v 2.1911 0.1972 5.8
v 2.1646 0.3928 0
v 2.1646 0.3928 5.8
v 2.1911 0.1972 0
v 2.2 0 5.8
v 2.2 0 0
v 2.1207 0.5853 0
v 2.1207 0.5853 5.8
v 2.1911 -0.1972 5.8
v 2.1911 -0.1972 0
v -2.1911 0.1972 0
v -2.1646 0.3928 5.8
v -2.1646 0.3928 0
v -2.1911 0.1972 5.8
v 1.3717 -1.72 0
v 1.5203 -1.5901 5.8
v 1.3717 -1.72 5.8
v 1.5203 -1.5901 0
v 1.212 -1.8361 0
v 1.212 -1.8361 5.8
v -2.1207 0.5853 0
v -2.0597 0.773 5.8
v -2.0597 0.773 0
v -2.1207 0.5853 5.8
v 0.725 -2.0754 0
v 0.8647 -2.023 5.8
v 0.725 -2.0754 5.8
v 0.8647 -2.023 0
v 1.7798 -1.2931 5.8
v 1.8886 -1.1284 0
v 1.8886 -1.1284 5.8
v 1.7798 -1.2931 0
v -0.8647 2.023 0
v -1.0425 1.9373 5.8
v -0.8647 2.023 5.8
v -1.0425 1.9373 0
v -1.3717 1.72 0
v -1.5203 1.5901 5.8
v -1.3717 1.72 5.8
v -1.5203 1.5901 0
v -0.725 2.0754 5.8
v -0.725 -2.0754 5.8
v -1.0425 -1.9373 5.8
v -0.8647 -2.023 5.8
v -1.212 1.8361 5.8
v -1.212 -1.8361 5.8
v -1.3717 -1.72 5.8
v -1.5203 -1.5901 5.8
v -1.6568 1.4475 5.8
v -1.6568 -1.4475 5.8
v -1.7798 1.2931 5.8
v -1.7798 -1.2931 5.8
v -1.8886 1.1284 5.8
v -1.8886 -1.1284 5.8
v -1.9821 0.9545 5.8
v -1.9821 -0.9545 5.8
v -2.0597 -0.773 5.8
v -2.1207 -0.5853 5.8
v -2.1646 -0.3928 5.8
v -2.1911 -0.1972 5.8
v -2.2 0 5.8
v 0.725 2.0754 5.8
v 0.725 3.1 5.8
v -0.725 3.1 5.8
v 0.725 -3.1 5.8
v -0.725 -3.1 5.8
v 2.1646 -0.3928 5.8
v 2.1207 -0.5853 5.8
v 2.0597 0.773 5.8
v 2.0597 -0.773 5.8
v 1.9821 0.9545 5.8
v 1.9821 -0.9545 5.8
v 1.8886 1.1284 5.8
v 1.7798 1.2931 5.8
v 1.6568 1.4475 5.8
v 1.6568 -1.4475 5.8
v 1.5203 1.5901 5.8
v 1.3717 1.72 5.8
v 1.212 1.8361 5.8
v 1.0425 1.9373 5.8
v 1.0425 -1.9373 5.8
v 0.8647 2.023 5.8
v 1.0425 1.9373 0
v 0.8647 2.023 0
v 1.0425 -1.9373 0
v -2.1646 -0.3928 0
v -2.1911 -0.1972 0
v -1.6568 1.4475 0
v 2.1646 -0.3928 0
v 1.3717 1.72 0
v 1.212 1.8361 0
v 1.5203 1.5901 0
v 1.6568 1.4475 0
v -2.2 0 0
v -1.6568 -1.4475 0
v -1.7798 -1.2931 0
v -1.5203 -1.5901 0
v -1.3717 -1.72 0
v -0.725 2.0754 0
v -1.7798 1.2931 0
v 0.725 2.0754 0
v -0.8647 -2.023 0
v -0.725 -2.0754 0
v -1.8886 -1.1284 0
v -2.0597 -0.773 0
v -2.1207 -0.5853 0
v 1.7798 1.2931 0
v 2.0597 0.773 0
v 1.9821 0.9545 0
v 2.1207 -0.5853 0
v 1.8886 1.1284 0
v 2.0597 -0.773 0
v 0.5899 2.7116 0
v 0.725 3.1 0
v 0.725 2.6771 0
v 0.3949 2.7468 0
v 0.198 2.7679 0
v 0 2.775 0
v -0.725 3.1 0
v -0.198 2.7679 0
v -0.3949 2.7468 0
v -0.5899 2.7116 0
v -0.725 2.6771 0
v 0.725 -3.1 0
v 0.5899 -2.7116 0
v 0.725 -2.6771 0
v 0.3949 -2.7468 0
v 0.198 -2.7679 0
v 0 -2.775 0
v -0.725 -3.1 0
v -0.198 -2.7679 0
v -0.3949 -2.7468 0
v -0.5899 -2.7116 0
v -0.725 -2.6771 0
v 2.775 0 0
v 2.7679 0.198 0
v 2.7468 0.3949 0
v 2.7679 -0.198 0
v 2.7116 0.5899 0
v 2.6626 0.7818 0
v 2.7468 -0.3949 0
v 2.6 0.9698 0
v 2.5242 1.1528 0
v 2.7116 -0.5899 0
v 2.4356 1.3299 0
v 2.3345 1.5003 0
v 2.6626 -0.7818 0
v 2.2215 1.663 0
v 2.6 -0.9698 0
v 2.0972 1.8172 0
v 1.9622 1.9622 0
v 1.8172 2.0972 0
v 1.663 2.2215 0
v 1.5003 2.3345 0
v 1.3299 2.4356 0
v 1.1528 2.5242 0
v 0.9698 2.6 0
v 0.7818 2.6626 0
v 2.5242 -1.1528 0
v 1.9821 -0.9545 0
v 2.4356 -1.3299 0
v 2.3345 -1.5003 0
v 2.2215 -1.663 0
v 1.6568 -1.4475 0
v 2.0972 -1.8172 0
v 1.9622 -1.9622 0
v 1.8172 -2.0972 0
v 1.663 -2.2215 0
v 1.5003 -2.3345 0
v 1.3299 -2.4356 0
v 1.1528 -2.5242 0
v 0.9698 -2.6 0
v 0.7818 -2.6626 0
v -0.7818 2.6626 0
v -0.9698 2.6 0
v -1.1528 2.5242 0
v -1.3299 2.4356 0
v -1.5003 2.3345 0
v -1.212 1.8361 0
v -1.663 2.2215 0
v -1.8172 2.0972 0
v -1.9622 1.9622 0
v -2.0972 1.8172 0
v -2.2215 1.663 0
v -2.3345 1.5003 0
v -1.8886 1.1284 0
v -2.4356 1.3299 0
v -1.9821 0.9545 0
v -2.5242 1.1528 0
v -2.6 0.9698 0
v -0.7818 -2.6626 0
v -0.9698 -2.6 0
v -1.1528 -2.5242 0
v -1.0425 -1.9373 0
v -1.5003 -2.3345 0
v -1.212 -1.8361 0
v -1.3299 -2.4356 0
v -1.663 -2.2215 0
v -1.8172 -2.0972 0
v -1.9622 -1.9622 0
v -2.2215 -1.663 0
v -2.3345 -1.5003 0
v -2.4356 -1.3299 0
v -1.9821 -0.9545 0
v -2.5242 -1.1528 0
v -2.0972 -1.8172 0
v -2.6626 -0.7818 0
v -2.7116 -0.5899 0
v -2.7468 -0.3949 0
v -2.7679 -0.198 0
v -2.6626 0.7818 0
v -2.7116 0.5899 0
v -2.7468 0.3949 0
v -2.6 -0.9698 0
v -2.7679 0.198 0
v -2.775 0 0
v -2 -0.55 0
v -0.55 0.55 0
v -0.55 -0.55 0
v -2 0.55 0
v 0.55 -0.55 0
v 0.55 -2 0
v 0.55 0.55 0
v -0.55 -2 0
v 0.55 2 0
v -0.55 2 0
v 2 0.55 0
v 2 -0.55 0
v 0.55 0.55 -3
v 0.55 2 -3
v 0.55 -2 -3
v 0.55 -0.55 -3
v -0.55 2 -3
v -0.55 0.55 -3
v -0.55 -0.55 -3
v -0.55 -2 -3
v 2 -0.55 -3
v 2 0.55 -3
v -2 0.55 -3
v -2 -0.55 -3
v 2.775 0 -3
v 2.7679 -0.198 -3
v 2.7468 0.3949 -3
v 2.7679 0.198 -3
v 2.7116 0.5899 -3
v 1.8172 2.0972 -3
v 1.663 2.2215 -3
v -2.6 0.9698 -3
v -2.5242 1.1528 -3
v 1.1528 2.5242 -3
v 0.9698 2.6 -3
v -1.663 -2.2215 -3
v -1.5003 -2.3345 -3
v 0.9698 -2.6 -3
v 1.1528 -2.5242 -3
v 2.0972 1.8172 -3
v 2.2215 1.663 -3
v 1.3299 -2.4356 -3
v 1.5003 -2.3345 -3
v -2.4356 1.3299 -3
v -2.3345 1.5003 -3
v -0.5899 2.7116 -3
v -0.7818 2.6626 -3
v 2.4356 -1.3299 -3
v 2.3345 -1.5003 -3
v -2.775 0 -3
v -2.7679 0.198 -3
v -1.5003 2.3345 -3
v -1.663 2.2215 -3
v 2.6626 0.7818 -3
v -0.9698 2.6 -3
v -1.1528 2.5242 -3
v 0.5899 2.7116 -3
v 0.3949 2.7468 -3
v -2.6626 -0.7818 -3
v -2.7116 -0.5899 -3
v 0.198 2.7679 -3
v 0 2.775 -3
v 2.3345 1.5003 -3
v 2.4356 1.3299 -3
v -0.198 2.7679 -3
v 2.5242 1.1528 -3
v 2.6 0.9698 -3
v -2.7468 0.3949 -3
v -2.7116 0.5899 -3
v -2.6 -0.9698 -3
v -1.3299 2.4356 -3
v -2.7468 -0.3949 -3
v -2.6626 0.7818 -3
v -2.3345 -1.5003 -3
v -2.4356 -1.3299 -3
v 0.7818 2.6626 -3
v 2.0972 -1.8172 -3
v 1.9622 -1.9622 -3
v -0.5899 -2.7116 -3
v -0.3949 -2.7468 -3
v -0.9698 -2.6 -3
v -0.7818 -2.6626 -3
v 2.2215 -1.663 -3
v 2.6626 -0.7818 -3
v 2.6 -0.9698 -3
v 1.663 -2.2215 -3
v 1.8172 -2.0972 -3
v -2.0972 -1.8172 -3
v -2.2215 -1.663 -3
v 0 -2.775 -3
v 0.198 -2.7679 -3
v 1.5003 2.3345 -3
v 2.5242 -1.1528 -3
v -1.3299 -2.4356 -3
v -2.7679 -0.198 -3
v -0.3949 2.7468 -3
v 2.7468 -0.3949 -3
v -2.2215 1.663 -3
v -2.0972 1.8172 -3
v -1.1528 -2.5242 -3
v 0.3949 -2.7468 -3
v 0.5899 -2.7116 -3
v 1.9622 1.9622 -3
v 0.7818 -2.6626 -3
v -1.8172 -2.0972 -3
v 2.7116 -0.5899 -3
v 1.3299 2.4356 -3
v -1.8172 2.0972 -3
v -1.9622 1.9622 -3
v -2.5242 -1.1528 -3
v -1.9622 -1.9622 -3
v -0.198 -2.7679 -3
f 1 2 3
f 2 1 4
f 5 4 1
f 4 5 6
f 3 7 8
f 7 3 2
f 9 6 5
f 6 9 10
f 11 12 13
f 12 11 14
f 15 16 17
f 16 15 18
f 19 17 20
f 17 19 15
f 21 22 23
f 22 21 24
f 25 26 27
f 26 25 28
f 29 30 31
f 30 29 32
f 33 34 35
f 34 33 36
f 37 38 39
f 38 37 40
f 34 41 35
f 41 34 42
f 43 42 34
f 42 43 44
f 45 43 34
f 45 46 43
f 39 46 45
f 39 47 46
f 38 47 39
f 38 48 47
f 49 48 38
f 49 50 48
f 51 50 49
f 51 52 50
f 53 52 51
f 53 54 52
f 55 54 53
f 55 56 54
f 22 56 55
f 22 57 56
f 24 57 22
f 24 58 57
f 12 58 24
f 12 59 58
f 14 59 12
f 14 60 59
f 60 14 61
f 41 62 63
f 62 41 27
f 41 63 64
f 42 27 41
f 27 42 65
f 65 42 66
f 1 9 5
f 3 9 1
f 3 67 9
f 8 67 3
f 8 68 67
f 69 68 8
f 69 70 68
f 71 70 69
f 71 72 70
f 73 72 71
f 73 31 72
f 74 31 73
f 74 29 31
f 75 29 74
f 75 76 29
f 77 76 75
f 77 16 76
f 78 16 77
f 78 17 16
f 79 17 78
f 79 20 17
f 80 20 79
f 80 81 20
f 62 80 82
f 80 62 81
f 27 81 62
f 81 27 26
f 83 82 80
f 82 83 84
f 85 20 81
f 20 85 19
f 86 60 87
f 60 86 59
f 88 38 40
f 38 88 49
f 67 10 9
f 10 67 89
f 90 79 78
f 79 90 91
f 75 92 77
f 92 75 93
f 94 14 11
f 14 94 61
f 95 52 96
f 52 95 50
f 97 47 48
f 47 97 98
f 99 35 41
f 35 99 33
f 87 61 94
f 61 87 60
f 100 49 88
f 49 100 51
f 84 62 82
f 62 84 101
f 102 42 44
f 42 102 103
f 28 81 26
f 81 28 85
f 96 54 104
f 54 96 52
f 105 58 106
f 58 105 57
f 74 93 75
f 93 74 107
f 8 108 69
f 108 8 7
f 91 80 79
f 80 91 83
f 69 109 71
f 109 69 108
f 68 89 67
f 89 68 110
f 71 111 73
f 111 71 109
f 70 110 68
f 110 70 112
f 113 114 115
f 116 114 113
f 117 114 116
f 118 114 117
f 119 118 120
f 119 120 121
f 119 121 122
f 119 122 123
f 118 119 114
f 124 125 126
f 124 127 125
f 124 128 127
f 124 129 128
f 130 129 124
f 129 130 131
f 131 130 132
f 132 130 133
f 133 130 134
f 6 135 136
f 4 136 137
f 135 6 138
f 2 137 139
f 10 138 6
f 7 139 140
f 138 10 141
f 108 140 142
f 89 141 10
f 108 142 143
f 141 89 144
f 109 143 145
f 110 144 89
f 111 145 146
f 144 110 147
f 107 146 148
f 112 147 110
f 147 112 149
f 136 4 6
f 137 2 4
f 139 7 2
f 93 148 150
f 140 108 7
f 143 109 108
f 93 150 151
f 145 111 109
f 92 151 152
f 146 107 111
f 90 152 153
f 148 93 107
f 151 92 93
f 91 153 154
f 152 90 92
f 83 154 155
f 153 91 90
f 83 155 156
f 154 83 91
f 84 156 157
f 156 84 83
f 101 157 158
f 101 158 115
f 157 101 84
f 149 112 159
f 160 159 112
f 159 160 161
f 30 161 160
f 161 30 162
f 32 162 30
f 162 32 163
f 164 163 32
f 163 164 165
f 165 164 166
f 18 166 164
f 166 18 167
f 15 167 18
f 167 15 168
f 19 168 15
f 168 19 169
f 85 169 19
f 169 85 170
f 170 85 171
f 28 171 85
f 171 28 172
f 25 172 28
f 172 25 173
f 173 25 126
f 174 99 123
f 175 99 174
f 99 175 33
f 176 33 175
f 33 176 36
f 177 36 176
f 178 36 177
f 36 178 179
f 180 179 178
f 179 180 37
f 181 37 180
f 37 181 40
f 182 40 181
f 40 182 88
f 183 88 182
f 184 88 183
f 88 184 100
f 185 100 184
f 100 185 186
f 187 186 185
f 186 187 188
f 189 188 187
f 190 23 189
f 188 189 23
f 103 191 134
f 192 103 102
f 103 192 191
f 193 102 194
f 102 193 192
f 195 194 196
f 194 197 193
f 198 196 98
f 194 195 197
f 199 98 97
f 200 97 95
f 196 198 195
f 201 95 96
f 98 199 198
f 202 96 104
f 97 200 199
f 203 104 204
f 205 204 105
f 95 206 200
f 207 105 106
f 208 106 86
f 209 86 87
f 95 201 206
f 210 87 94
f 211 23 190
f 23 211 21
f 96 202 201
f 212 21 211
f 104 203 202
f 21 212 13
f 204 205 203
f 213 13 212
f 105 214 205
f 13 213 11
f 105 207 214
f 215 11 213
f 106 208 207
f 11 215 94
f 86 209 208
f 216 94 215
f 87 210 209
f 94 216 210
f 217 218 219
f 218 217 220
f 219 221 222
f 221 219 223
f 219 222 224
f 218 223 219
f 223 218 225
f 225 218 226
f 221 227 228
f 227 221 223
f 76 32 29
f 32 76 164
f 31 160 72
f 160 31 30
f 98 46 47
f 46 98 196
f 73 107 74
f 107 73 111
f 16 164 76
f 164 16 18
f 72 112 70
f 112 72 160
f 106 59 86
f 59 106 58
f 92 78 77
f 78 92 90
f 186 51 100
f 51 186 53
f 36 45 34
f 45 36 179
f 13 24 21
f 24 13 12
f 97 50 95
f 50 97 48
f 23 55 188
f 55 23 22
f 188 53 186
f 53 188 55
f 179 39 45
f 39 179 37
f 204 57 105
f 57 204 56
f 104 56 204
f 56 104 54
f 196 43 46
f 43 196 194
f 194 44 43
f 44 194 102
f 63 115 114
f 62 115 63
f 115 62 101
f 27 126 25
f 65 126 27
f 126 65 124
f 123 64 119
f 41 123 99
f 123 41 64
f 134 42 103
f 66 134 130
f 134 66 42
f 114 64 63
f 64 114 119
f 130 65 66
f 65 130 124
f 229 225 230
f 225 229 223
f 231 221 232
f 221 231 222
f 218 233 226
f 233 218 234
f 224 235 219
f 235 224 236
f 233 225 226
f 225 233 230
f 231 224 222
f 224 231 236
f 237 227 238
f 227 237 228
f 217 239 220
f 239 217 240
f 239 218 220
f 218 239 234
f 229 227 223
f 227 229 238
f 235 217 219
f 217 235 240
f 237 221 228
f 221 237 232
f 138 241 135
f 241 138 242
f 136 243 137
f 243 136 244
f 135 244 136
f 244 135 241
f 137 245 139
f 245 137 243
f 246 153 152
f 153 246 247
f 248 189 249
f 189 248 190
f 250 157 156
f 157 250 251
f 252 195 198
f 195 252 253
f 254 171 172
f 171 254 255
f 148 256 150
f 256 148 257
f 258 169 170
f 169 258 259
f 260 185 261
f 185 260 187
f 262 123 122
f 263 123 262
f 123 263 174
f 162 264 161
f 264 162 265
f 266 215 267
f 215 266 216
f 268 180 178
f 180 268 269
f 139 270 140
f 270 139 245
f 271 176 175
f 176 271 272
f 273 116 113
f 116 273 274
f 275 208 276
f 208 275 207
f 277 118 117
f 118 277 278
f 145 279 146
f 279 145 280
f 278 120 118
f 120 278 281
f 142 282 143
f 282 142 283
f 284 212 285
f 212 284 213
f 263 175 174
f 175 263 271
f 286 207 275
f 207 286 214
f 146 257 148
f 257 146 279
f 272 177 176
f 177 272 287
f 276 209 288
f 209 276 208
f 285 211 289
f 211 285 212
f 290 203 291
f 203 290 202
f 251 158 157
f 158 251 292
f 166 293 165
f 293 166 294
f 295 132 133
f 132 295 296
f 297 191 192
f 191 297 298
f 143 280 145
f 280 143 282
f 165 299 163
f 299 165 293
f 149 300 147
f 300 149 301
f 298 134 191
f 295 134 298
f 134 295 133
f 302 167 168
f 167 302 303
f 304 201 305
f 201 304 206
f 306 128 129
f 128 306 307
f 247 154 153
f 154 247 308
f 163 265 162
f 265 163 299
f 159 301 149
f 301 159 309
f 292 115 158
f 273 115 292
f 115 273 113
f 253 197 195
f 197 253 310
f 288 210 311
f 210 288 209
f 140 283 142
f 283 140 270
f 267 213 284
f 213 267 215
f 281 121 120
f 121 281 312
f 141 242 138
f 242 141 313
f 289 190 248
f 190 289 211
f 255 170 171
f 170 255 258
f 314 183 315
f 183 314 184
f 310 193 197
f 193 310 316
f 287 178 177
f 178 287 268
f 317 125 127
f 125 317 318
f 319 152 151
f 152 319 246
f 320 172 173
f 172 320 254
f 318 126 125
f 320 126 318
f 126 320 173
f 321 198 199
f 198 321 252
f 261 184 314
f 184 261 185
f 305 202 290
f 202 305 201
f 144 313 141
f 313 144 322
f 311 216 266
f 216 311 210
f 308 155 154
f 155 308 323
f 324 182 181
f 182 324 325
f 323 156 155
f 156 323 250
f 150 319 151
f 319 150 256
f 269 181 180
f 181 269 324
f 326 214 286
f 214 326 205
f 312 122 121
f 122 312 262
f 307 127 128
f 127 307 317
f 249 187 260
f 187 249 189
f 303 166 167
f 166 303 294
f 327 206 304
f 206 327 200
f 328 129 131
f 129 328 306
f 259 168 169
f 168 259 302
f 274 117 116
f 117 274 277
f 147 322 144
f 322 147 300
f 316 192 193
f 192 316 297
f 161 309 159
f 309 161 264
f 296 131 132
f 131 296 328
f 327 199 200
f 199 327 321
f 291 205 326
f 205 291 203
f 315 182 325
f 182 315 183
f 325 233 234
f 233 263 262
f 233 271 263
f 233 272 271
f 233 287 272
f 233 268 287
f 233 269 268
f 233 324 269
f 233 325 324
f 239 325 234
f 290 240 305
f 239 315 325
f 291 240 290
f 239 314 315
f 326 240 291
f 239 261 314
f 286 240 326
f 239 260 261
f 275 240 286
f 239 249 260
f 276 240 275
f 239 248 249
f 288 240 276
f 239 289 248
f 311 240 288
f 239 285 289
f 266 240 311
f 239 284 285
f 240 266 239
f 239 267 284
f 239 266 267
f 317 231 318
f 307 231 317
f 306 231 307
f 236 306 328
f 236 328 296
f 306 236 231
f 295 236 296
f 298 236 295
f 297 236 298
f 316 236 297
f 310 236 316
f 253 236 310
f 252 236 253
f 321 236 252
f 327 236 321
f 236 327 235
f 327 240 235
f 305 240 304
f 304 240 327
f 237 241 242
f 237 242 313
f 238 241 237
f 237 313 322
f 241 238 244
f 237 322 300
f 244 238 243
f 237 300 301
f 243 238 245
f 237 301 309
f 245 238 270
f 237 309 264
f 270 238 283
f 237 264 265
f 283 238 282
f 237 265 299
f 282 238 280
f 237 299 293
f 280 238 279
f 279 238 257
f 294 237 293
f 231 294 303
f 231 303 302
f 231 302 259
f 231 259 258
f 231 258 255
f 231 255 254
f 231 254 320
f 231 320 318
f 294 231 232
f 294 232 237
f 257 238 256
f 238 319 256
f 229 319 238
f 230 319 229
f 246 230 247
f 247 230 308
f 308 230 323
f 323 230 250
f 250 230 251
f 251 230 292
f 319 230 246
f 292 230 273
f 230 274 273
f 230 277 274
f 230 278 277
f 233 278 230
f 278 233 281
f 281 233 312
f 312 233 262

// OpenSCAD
// Stems and adapters to connect vintage key caps to modern switches
// (c) Bertrand Le Roy
// Licensed under MIT

$fa = 1;
$fs = 0.2;

// Cap type
cap_type = "Atari XE ◎"; // [Atari XE ◎, Atari XE ■, Atari XE Console Key, Atari XE Console Set, Atari XE F1-4 Set, Atari XL ✚, Atari XL Alps ▬, Atari XL ⧇, Atari 800 ■, Atari XL Console Key, Atari 1200XL Console Key, KailhBox]

// Stem type
stem_type = "Low-pro adapter"; // [Low-pro adapter, Kailh Choc v1, Kailh Box Pink, MX Adapter]

// Legend
legend = ""; // ["", Start, Option, Select, Help, Reset, F1, F2, F3, F4, F5, F6, F7, F8, F9, F10, F11, F12]

// Repeat rows
rows = 1; // [1:1:10]

// Repeat columns
columns = 1; // [1:1:10]

// Link models from the sides
link_models = false;

// Support from under
support = false;

// Rotate switch 90 degrees
rotate_switch = false;

// Accurate production
accurate = true;

row_count = rows;
column_count = cap_type == "Atari XE Console Set" ? 5 : cap_type == "Atari XE F1-4 Set" ? 4 : columns;

module nil() {}

box_width = 6.40;
box_height = 4.7;
box_inner_width = 6;
box_inner_corner_radius = 2;
box_cross_x_thickness = 1.3;
box_cross_y_thickness = 1.1;
box_cross_width = 4;
box_bottom_thickness = 0.7;
box_bottom_outer_offset = 0.02;
extra_floor = 1;
support_diameter = 1.5;
support_height = 2;
support_plate_height = 1.5;

module kailh_box() {
  union() {
    difference() {
      cube([box_width, box_width, box_height], center = true);
      minkowski() {
        cube([
          box_inner_width - box_inner_corner_radius * 2,
          box_inner_width - box_inner_corner_radius * 2,
          box_height + 0.1], center = true);
        cylinder(r = box_inner_corner_radius);
      }
    };
    cube([box_cross_width, box_cross_x_thickness, box_height], center = true);
    cube([box_cross_y_thickness, box_cross_width, box_height], center = true);
    translate([0, 0, (box_bottom_thickness - box_height) / 2])
      cube([box_width, box_width, box_bottom_thickness], center = true);
  }
}

atari_box_width = 6.40;
atari_box_height = 4;
atari_square_width = accurate ? 3.05 : 3.2;
atari_square_depth = 2.8;
atari_square_circle_radius = atari_square_width * sqrt(2) / 2;
//atari_box_bottom_thickness = 0.7;
atari_box_bottom_outer_offset = 0.05;

module atarixe_square() {
  union() {
    difference() {
      cube([atari_box_width, atari_box_width, atari_box_height], center = true);
      cube([atari_square_width, atari_square_width, atari_box_height + 0.1], center = true);
      translate([0, 0, (atari_square_depth - 1) / 2])
        cylinder(r = atari_square_circle_radius, h = atari_box_height - atari_square_depth + 0.1);
      // Add a recess at the bottom so if resin residues cling in the angles, they do so without preventing the cap from going in completely.
      rotate([0, 0, 45])
        translate([0, 0, 1 - atari_square_depth - 0.1])
          cylinder(h = 1, d1 = atari_square_circle_radius * 2 + 1, d2 = atari_square_circle_radius * 2, $fn = 4);
    }
  }
}

atari_circle_inner_diameter = accurate ? 4.40 : 4.25;
atari_circle_wing_thickness = accurate ? 1.45 : 1.40;
atari_circle_depth = accurate ? 4.8 : 4.0;

module atarixe_circle() {
  union() {
    cylinder(r = atari_circle_inner_diameter / 2, h = atari_circle_depth + extra_floor);
    translate([0, 0, (atari_circle_depth + extra_floor) / 2])
      cube([atari_circle_wing_thickness, atari_box_width - 0.2, atari_circle_depth + extra_floor], center = true);
  }
}

atari_alps_width = 4.6;
atari_alps_depth = 2.3;
atari_alps_height = box_height - 2;
atari_alps_offset = 0;
atari_alps_teeth_width = 0.4;
atari_alps_teeth_depth = 0.2;

module atarixl_alps() {
  union() {
    difference() {
      cube([box_width, box_width, box_height], center = true);
      translate([0, atari_alps_offset + atari_alps_teeth_depth, (box_height - atari_alps_height) / 2 + 0.1])
        difference() {
          cube([atari_alps_width, atari_alps_depth + atari_alps_teeth_depth, atari_alps_height + 0.1], center = true);
          translate([atari_alps_width / 4, atari_alps_depth / 2 + 0.05, 0])
            cube([atari_alps_teeth_width, atari_alps_teeth_depth + 0.05, atari_alps_height], center = true);
          translate([-atari_alps_width / 4, atari_alps_depth / 2 + 0.05, 0])
            cube([atari_alps_teeth_width, atari_alps_teeth_depth + 0.05, atari_alps_height], center = true);
        }
    };
    translate([0, 0, (box_bottom_thickness - box_height) / 2])
      cube([box_width, box_width, box_bottom_thickness], center = true);
  }
}

atarixl_cross_thickness = 1.3;
atarixl_cross_size = 4.4;
atarixl_cross_height = 3.5;
atarixl_cross_teeth_width = 0.4;
atarixl_cross_teeth_depth = 0.05;

module atarixl_cross() {
  translate([0, 0, 0.05])
    union() {
      cube([atarixl_cross_thickness, atarixl_cross_size, atarixl_cross_height + 0.1], center = true);
      cube([atarixl_cross_size, atarixl_cross_thickness, atarixl_cross_height + 0.1], center = true);
      // Teeth:
      translate([3 * atarixl_cross_size / 8, 0, 0])
        cube([atarixl_cross_teeth_width, atarixl_cross_thickness + atarixl_cross_teeth_depth * 2, atarixl_cross_height], center = true);
      translate([-3 * atarixl_cross_size / 8, 0, 0])
        cube([atarixl_cross_teeth_width, atarixl_cross_thickness + atarixl_cross_teeth_depth * 2, atarixl_cross_height], center = true);
      translate([0, 3 * atarixl_cross_size / 8, 0])
        cube([atarixl_cross_thickness + atarixl_cross_teeth_depth * 2, atarixl_cross_teeth_width, atarixl_cross_height], center = true);
      translate([0, -3 * atarixl_cross_size / 8, 0])
        cube([atarixl_cross_thickness + atarixl_cross_teeth_depth * 2, atarixl_cross_teeth_width, atarixl_cross_height], center = true);
    }
}

atarixl_square_size = cap_type == "Atari 800 ■" ? 4.7 : 5.0;
atarixl_square_height = cap_type == "Atari 800 ■" ? 4 : 7;
atarixl_square_teeth_width = 0.4;
atarixl_square_teeth_depth = 0.05;

module atarixl_square() {
  union() {
    cube([atarixl_square_size, atarixl_square_size, atarixl_square_height], center = true);
    cube([atarixl_square_size + atarixl_square_teeth_depth * 2, atarixl_square_teeth_width, atarixl_square_height], center = true);
    cube([atarixl_square_teeth_width, atarixl_square_size + atarixl_square_teeth_depth * 2, atarixl_square_height], center = true);
  }
}

kailh_stem_horizontal_offset = 0.47;
kailh_stem_spring_column_height = 6.3;
kailh_stem_spring_column_bottom_diameter = 1.40;
kailh_stem_spring_column_upper_diameter = 1;
kailh_stem_spring_column_top_height = 0.3;
kailh_stem_spring_column_cone_height = 1.5;
kailh_stem_spring_column_offset = -0.60;
kailh_stem_main_height = 5;
kailh_stem_main_width = box_width;
kailh_stem_main_depth_left = 4.0;
kailh_stem_main_depth_middle = 4.65;
kailh_stem_main_depth_right = 3.25;
kailh_stem_main_extension_width = 1.8;
kailh_stem_main_hole_diameter = 3.8;
kailh_stem_main_hole_width = 5.1;
kailh_stem_main_hole_depth = 2;
kailh_stem_main_hole_corner_radius = 0.5;
kailh_stem_rail_thickness = 0.6;
kailh_stem_rail_width = 0.35;
kailh_stem_rail3_width = 4.70;
kailh_stem_left_rail1_x = 0.8;
kailh_stem_left_rail2_x = 3.2;
kailh_stem_left_rail3_y = 2.9;
kailh_stem_right_rail1_x = 0.8;
kailh_stem_right_rail2_x = 3.0;
kailh_stem_right_rail3_y = 2.9;
kailh_clicker_top_height = 1.3;
kailh_clicker_top_length = 0.3;
kailh_clicker_rail_height = 0.3;
kailh_clicker_gentle_slope_length = 1.75;
kailh_clicker_steep_slope_length = 0.35;
kailh_clicker_flat_length = 2;
kailh_clicker_rail_width = 0.6;
kailh_breaker_width = 1.6;
kailh_breaker_flat_length = 1.5;
kailh_breaker_slope_length = 1.9;
kailh_breaker_top = 0.8;
kailh_breaker_outcrop = 0.8;
kailh_breaker_bottom = -0.4;

kailh_stem_height = kailh_stem_spring_column_height;

module kailh_rails(rail1_x, rail2_x, rail3_y, rail_width, rail_thickness, rail3_width) {
  translate([0, rail1_x, (kailh_stem_spring_column_height - kailh_stem_main_height) / 2])
    cube([rail_thickness, rail_width, kailh_stem_main_height], center = true);
  translate([0, rail2_x, (kailh_stem_spring_column_height - kailh_stem_main_height) / 2])
    cube([rail_thickness, rail_width, kailh_stem_main_height], center = true);
  translate([0, (rail2_x + rail1_x) / 2, rail3_y - rail3_width / 2])
    cube([rail_thickness, rail2_x - rail1_x - rail_width, rail3_width], center = true);
}

module kailh_stem() {
  union() {
    // Main part
    translate([0, 0, (kailh_stem_spring_column_height - kailh_stem_main_height) / 2])
      difference() {
        union() {
          linear_extrude(height = kailh_stem_main_height, center = true) {
            polygon(points = [
              [-kailh_stem_main_width / 2, -box_width / 2],
              [kailh_stem_main_width / 2, -box_width / 2],
              [kailh_stem_main_width / 2, kailh_stem_main_depth_right - box_width / 2],
              [kailh_stem_main_extension_width / 2 + (kailh_stem_main_depth_middle - kailh_stem_main_depth_right), kailh_stem_main_depth_right - box_width / 2],
              [kailh_stem_main_extension_width / 2, kailh_stem_main_depth_middle - box_width / 2],
              [-kailh_stem_main_extension_width / 2, kailh_stem_main_depth_middle - box_width / 2],
              [-kailh_stem_main_extension_width / 2 - (kailh_stem_main_depth_middle - kailh_stem_main_depth_left), kailh_stem_main_depth_left - box_width / 2],
              [-kailh_stem_main_width / 2, kailh_stem_main_depth_left - box_width / 2],
            ], convexity = 10);
          }
          // Contact breaker
          kailh_breaker_height = kailh_breaker_slope_length + kailh_breaker_flat_length;
          translate([kailh_stem_main_width / 2, 0, kailh_breaker_height - kailh_stem_main_height / 2 - kailh_breaker_outcrop])
            rotate([-90, 0, 90])
              linear_extrude(height = kailh_breaker_width) {
                polygon(points = [
                  [kailh_breaker_bottom, 0],
                  [0, 0],
                  [kailh_breaker_top, kailh_breaker_slope_length],
                  [kailh_breaker_top, kailh_breaker_height],
                  [kailh_breaker_bottom, kailh_breaker_height]
                ], convexity = 4);
              }
        }
        translate([0, kailh_stem_spring_column_offset, 0])
          union() {
            translate([0, 0, -extra_floor/2 - 0.5])
              cylinder(r = kailh_stem_main_hole_diameter / 2, h = kailh_stem_height - extra_floor + 1, center = true);
            hull() {
              translate([kailh_stem_main_hole_corner_radius - kailh_stem_main_hole_width / 2, -kailh_stem_main_hole_corner_radius, -extra_floor])
                cylinder(r = kailh_stem_main_hole_corner_radius, h = kailh_stem_height - extra_floor + 1, center = true);
              translate([kailh_stem_main_hole_width / 2 - kailh_stem_main_hole_corner_radius, -kailh_stem_main_hole_corner_radius, -extra_floor])
                cylinder(r = kailh_stem_main_hole_corner_radius, h = kailh_stem_height - extra_floor + 1, center = true);
              translate([kailh_stem_main_hole_corner_radius - kailh_stem_main_hole_width / 2, kailh_stem_main_hole_corner_radius - kailh_stem_main_hole_depth, -extra_floor])
                cylinder(r = kailh_stem_main_hole_corner_radius, h = kailh_stem_height - extra_floor + 1, center = true);
              translate([kailh_stem_main_hole_width / 2 - kailh_stem_main_hole_corner_radius, kailh_stem_main_hole_corner_radius - kailh_stem_main_hole_depth, -extra_floor])
                cylinder(r = kailh_stem_main_hole_corner_radius, h = kailh_stem_height - extra_floor + 1, center = true);
            }
          }
      }
    // Spring cone
    translate([0, kailh_stem_spring_column_offset, kailh_stem_spring_column_height / 2])
      rotate([180, 0, 0])
        rotate_extrude()
          polygon(points = [
            [0, 0],
            [kailh_stem_spring_column_bottom_diameter / 2, 0],
            [kailh_stem_spring_column_bottom_diameter / 2, kailh_stem_spring_column_height - kailh_stem_spring_column_cone_height - kailh_stem_spring_column_top_height],
            [kailh_stem_spring_column_upper_diameter / 2, kailh_stem_spring_column_height - kailh_stem_spring_column_top_height],
            [kailh_stem_spring_column_upper_diameter / 2, kailh_stem_spring_column_height],
            [0, kailh_stem_spring_column_height]
          ], convexity = 4);
    // Rails
    translate([-(kailh_stem_main_width + kailh_stem_rail_thickness) / 2, -kailh_stem_main_width / 2, 0])
      kailh_rails(kailh_stem_left_rail1_x, kailh_stem_left_rail2_x, kailh_stem_left_rail3_y, kailh_stem_rail_width, kailh_stem_rail_thickness, kailh_stem_rail3_width);
    translate([(kailh_stem_main_width + kailh_stem_rail_thickness) / 2, -kailh_stem_main_width / 2, 0])
      kailh_rails(kailh_stem_right_rail1_x, kailh_stem_right_rail2_x, kailh_stem_right_rail3_y, kailh_stem_rail_width, kailh_stem_rail_thickness, kailh_stem_rail3_width);
    // Clicker
    kailh_clicker_height = kailh_clicker_flat_length + kailh_clicker_gentle_slope_length + kailh_clicker_top_length + kailh_clicker_steep_slope_length;
    translate([kailh_stem_main_width / 2, -box_width / 2, kailh_stem_height / 2])
      rotate([0, 90, 180])
        linear_extrude(height = kailh_clicker_rail_width) {
          polygon(points = [
            [0, 0],
            [0, kailh_clicker_rail_height],
            [kailh_clicker_flat_length, kailh_clicker_rail_height],
            [kailh_clicker_flat_length + kailh_clicker_gentle_slope_length, kailh_clicker_top_height],
            [kailh_clicker_flat_length + kailh_clicker_gentle_slope_length + kailh_clicker_top_length, kailh_clicker_top_height],
            [kailh_clicker_height, 0]
          ], convexity = 4);
      }
  }
}

kailh_choc_height = 3.0 * 2;
kailh_choc_base_dimensions = [9.0, 3.95, 1.0];
kailh_choc_insert_distance = 5.7;
kailh_choc_insert_dimensions = accurate ? [1.15, 2.9, 4.0] : [0.90, 2.6, 3.6];
kailh_choc_insert_teeth_width = 0.4;
kailh_choc_insert_teeth_depth = "Atari XE Console Key" || cap_type == "Atari XE Console Set" || cap_type == "Atari XE F1-4 Set" ? 0.1 : 0.05;

module kailh_choc() {
  translate([0, 0, kailh_choc_height / 2])
    cube(kailh_choc_base_dimensions, center = true);
  translate([kailh_choc_insert_distance / 2, 0, kailh_choc_height / 4])
    union() {
      cube(kailh_choc_insert_dimensions, center = true);
      // Tooth
      cube([kailh_choc_insert_dimensions[0] + kailh_choc_insert_teeth_depth * 2, kailh_choc_insert_teeth_width, kailh_choc_insert_dimensions[2]], center = true);
    }
  translate([-kailh_choc_insert_distance / 2, 0, kailh_choc_height / 4])
    union() {
      cube(kailh_choc_insert_dimensions, center = true);
      cube([kailh_choc_insert_dimensions[0] + kailh_choc_insert_teeth_depth * 2, kailh_choc_insert_teeth_width, kailh_choc_insert_dimensions[2]], center = true);
    }
}

low_pro_adapter_height = 3.0;
mxadapter_stem_height = stem_type == "Low-pro adapter" ? low_pro_adapter_height : 3;
mxadapter_stem_diameter = 5.55;
mxadapter_cross_thickness = accurate ? 1.1 : 1.35;
mxadapter_cross_size = accurate ? 4 : 4.2;
mxadapter_floor_thickness = 0.;
mxadapter_resin_drain_diameter = mxadapter_cross_thickness;

module mx_adapter() {
  difference() {
    cylinder(r = mxadapter_stem_diameter / 2, h = mxadapter_stem_height, center = true);
    // The cross itself
    translate([0, 0, -mxadapter_floor_thickness * 1.5]) {
      cube([mxadapter_cross_thickness, mxadapter_cross_size, mxadapter_stem_height + mxadapter_floor_thickness + 0.2], center = true);
      cube([mxadapter_cross_size, mxadapter_cross_thickness, mxadapter_stem_height + mxadapter_floor_thickness + 0.2], center = true);
    }
    if (!accurate) {
      // Some resin drainage pipes
      translate([0, 0, -mxadapter_floor_thickness * 1.5 + mxadapter_stem_height / 2 - mxadapter_resin_drain_diameter / 2 - 0.1]) {
        rotate([90, 0, 0])
          cylinder(r = mxadapter_resin_drain_diameter / 2, h = mxadapter_stem_diameter, center = true);
        rotate([0, 90, 0])
          cylinder(r = mxadapter_resin_drain_diameter / 2, h = mxadapter_stem_diameter, center = true);
      }
    }
  }
}

fn_side = 26.4;
fn_depth = fn_side * cos(45) - 0.5;
fn_height = 9;
fn_fillet = 5;
fn_top_thickness = stem_type == "MX Adapter" ? fn_height - 6.5 : fn_height;
fn_hole_diameter = 16 * sqrt(2);
fn_stabilizer_diameter = 3.9;
fn_stabilizer_distance = 12;
fn_stabilizer_length = 5;
fn_legend_distance = 5;
fn_legend_depth = accurate ? 0.5 : 0.4;
fn_legend_size = 2.5;
fn_distance = 28.575;
fn_z_offset = stem_type == "Kailh Choc v1" ? -0.5 : 0;

module atari_fn(legend) {
  translate([-(fn_depth + fn_side) / 2, -fn_depth / 2, fn_z_offset - (fn_height - fn_top_thickness)])
    difference() {
      union() {
        difference() {
          union() {
            difference() {
              // Start with a big block
              cube([fn_depth + fn_side, fn_depth, fn_height]);
              // Remove an edge where the fillet will go
              translate([0, 0, fn_height - fn_fillet])
                rotate([45, 0, 0])
                  cube([fn_side * 1.5, fn_fillet / cos(45), fn_fillet / cos(45)]);
            }
            // Add the stabilizers
            translate([(fn_depth + fn_side) / 2 + fn_stabilizer_distance * cos(22.5), fn_depth / 2 + fn_stabilizer_distance * sin(22.5), -fn_stabilizer_length])
              cylinder(r = fn_stabilizer_diameter / 2, h = fn_stabilizer_length + 0.1);
            translate([(fn_depth + fn_side) / 2 - fn_stabilizer_distance * cos(22.5), fn_depth / 2 - fn_stabilizer_distance * sin(22.5), -fn_stabilizer_length])
              cylinder(r = fn_stabilizer_diameter / 2, h = fn_stabilizer_length + 0.1);
            // Support
            if (support) {
              translate([0, 0,  -fn_stabilizer_length - support_height + 0.05]) {
                translate([(fn_depth + fn_side) / 2 + fn_stabilizer_distance * cos(22.5), fn_depth / 2 + fn_stabilizer_distance * sin(22.5), 0])
                  cylinder(r = support_diameter / 2, h = support_height + 0.1);
                translate([(fn_depth + fn_side) / 2 - fn_stabilizer_distance * cos(22.5), fn_depth / 2 - fn_stabilizer_distance * sin(22.5), 0])
                  cylinder(r = support_diameter / 2, h = support_height + 0.1);
              }
            }
          }
          // Carve the legend
          translate([fn_depth, fn_depth - fn_legend_distance, fn_height - fn_legend_depth])
            linear_extrude(height = fn_legend_depth + 0.1)
              text(legend, size = fn_legend_size, font = "Arial:style=Bold", valign = "baseline");
        }
        // Add the fillet (which is a quarter-cylinder)
        translate([0, fn_fillet, fn_height - fn_fillet])
          rotate([0, 90, 0])
            difference() {
              cylinder(r = fn_fillet, h = fn_side * 1.3);
              // Remove the unused half of the cylinder
              translate([fn_fillet * 0.5, -fn_fillet * 1.2, -fn_side * 0.1])
                rotate([0, 0, 45])
                  cube([fn_fillet *2.2, fn_fillet * 6, fn_side * 1.5]);
            }
      }
      // Remove the angled part on the left
      translate([0, 0, -0.5])
        rotate([0, 0, 45])
          cube([fn_side, fn_side, fn_height + 1]);
      // And the angled part on the right
      translate([fn_side, 0, -0.5])
        rotate([0, 0, -45])
          cube([fn_side, fn_side, fn_height + 1]);
      // Dig a pyramid in the underside to make room for the switch,
      // plus two others on either side to make room for the adjacent switches
      translate([(fn_depth + fn_side) / 2, fn_depth / 2, -0.1])
        rotate([0, 0, 45])
          cylinder(r1 = fn_hole_diameter / 2, r2 = fn_hole_diameter / 2 - 1.5 * sqrt(2), h = fn_height - fn_top_thickness + 0.1, $fn = 4);
      translate([(fn_depth + fn_side) / 2 + fn_distance, fn_depth / 2, -0.1])
        rotate([0, 0, 45])
          cylinder(r1 = fn_hole_diameter / 2, r2 = fn_hole_diameter / 2 - 1.5 * sqrt(2), h = fn_height - fn_top_thickness + 0.1, $fn = 4);
      translate([(fn_depth + fn_side) / 2 - fn_distance, fn_depth / 2, -0.1])
        rotate([0, 0, 45])
          cylinder(r1 = fn_hole_diameter / 2, r2 = fn_hole_diameter / 2 - 1.5 * sqrt(2), h = fn_height - fn_top_thickness + 0.1, $fn = 4);
    }
}

xl_console_size = 18;
xl_console_height = 6.15;
xl_console_wall = 1.2;
xl_console_hole_depth = cap_type == "Atari 1200XL Console Key" ? 5 : stem_type == "Kailh Choc v1" ? 3 : 4.9;
xl_console_fillet = 1.5;

module xl_console() {
  translate([0, 0, xl_console_height / 2 - xl_console_hole_depth])
    difference() {
      minkowski() {
        cube([xl_console_size - xl_console_fillet * 2, xl_console_size - xl_console_fillet * 2, xl_console_height - 1], center = true);
        cylinder(r = xl_console_fillet, h = 1);
      }
      translate([0, 0, (xl_console_hole_depth - xl_console_height) / 2 - 0.1])
        cube([xl_console_size - 2 * xl_console_wall, xl_console_size - 2 * xl_console_wall, xl_console_hole_depth + 0.2], center = true);
  }
  if (support) {
    support_pillar_distance = xl_console_size / 2 + (1-sqrt(2)) / sqrt(2) * xl_console_fillet - support_diameter / 2 / sqrt(2);
    support_pillar_height = support_height;
    #translate([0, 0, 0.05 - support_pillar_height / 2 - xl_console_hole_depth]) {
      translate([support_pillar_distance, support_pillar_distance, 0])
        cylinder(r = support_diameter / 2, h = support_pillar_height);
      translate([-support_pillar_distance, -support_pillar_distance, 0])
        cylinder(r = support_diameter / 2, h = support_pillar_height);
    }
  }
}

union() {
  // Model links and support are only defined for some combinations of switch footprint and stem
  horiz_conn_radius = cap_type == "Atari XE ◎" ? atari_circle_wing_thickness / 2  :
    cap_type == "Atari XL ✚" ? atarixl_cross_thickness / 2 :
    cap_type == "Atari XE ■" ? 0.75 :
    0.75;
  horiz_conn_altitude = cap_type == "Atari XE ◎" ? rotate_switch ? extra_floor - horiz_conn_radius : atari_circle_depth + extra_floor - horiz_conn_radius :
    cap_type == "Atari XL Console Key" || cap_type == "Atari 1200XL Console Key" ? -xl_console_hole_depth / 2 + horiz_conn_radius :
    cap_type == "Atari XE ■" || cap_type == "Atari XL ✚" || cap_type == "Atari XL ⧇" || cap_type == "Atari 800 ■" || cap_type == "Atari XL Alps ▬" ? horiz_conn_radius :
    cap_type == "Atari XE Console Set" || cap_type == "Atari XE F1-4 Set" || cap_type == "Atari XE Console Key" ? fn_top_thickness - fn_height + horiz_conn_radius :
    20;
  horiz_offset = cap_type == "Atari XE ◎" ? 8 :
    cap_type == "Atari XL ✚" ? 6 : 
    cap_type == "Atari XE ■" ? 10 :
    cap_type == "Atari XL ⧇" || cap_type == "Atari 800 ■" ? 6 :
    cap_type == "Atari XL Alps ▬" ? 8 :
    cap_type == "Atari XE Console Key" || cap_type == "Atari XE Console Set" || cap_type == "Atari XE F1-4 Set" ? fn_depth + 2 :
    20;
  horiz_conn_length = cap_type == "Atari XE ◎" ? (horiz_offset - atari_circle_wing_thickness - atari_circle_inner_diameter) * (rotate_switch ? 2 : 1) + 0.1 :
    cap_type == "Atari XE ■" ? horiz_offset - atari_box_width + 0.1 :
    cap_type == "Atari XE Console Key" || cap_type == "Atari XE Console Set" || cap_type == "Atari XE F1-4 Set" ? horiz_offset - fn_depth + 0.2 :
    cap_type == "Atari XL Console Key" || cap_type == "Atari 1200XL Console Key" ? 20.5 + xl_console_fillet * 2 - xl_console_size :
    horiz_offset;
  vert_conn_radius = stem_type == "MX Adapter" || stem_type == "Low-pro adapter" ? atari_circle_wing_thickness / 2 :
    stem_type == "Kailh Choc v1" ? max(kailh_choc_base_dimensions[2] / 2, 0.5) :
    0.75;
  vert_conn_altitude = cap_type == "Atari XE Console Set" || cap_type == "Atari XE F1-4 Set" || cap_type == "Atari XE Console Key" ? fn_top_thickness - fn_height + horiz_conn_radius :
    cap_type == "Atari XL Console Key" || cap_type == "Atari 1200XL Console Key" ? -xl_console_hole_depth / 2 + vert_conn_radius:
    stem_type == "MX Adapter" || stem_type == "Low-pro adapter" ? vert_conn_radius - mxadapter_stem_height :
    stem_type == "Kailh Choc v1" ? 0.5 :
    20;
  vert_offset = cap_type == "Atari XE Console Key" || cap_type == "Atari XE Console Set" || cap_type == "Atari XE F1-4 Set" ? fn_side + 2 :
    cap_type == "Atari XL Console Key" || cap_type == "Atari 1200XL Console Key" ? 20 :
    stem_type == "MX Adapter" || stem_type == "Low-pro adapter" ? 8 :
    stem_type == "Kailh Choc v1" ? 10 :
    20;
  vert_conn_length = cap_type == "Atari XE Console Key" || cap_type == "Atari XE Console Set" || cap_type == "Atari XE F1-4 Set" ? 2.1 :
    cap_type == "Atari XL Console Key" || cap_type == "Atari 1200XL Console Key" ? 20.5 + xl_console_fillet * 2 - xl_console_size :
    stem_type == "MX Adapter" || stem_type == "Low-pro adapter" ? vert_offset - mxadapter_stem_diameter + 0.3 :
    stem_type == "Kailh Choc v1" ? vert_offset - kailh_choc_base_dimensions[0] + 0.1 :
    20;

  support_plate_length = row_count * horiz_offset;
  support_plate_width = column_count * vert_offset;
  support_z_offset = -support_plate_height -
    (cap_type == "Atari XE Console Set" || cap_type == "Atari XE F1-4 Set" || cap_type == "Atari XE Console Key" ? fn_height - 1.7  :
    cap_type == "Atari 1200XL Console Key" ? 5.5 :
    stem_type == "Kailh Choc v1" ? kailh_choc_insert_dimensions[2] : 0);

  echo(str("support_z_offset = ", support_z_offset));
  echo(str("vert_offset = ", vert_offset));

  for (row = [1:row_count]) {
    for (col = [1:column_count]) {
      translate([(col - 1) * vert_offset, (row - 1) * horiz_offset, 0]) {
        union() {
          if (cap_type == "KailhBox") {
            translate([0, 0, box_height / 2])
              kailh_box();
          }
          if (cap_type == "Atari XE ■") {
            translate([0, 0, atari_box_height / 2])
              atarixe_square();
          }
          if (cap_type == "Atari XE ◎") {
            extra_floor = 1;
            rotate([0, 0, rotate_switch ? 90 : 0])
              atarixe_circle();
          }
          if (cap_type == "Atari XL Alps ▬") {
            translate([0, 0, box_height / 2])
              atarixl_alps(); 
          }
          if (cap_type == "Atari XL ✚") {
            translate([0, 0, atarixl_cross_height / 2])
              atarixl_cross();
          }
          if (cap_type == "Atari XL ⧇" || cap_type == "Atari 800 ■") {
            translate([0, 0, atarixl_square_height / 2])
              atarixl_square();
          }
          if (cap_type == "Atari XE Console Key") {
            atari_fn(legend);
          }
          if (cap_type == "Atari XE Console Set") {
            atari_fn(["Start", "Option", "Select", "Help", "Reset"][col - 1]);
          }
          if (cap_type == "Atari XE F1-4 Set") {
            atari_fn(["F1", "F2", "F3", "F4"][col - 1]);
          }
          if (cap_type == "Atari XL Console Key" || cap_type == "Atari 1200XL Console Key") {
            xl_console();
          }
          if (stem_type == "Kailh Box Pink") {
            translate([0, kailh_stem_horizontal_offset, -kailh_stem_height / 2])
              rotate([0, 0, rotate_switch ? 90 : 0])
                kailh_stem();
          }
          if (stem_type == "Kailh Choc v1") {
            translate([0, 0, -kailh_choc_height / 2 + kailh_choc_base_dimensions[2] / 2])
              kailh_choc();
          }
          if (stem_type == "MX Adapter" || stem_type == "Low-pro adapter") {
            translate([0, 0, -mxadapter_stem_height / 2])
              mx_adapter();
          }
          if (link_models) {
            if (row > 1) {
              translate([0, -horiz_offset / 2 + 0.05, horiz_conn_altitude])
                rotate([90, 0, 0])
                  cylinder(r = horiz_conn_radius, h = horiz_conn_length, center = true);
            }
            if (col > 1) {
              translate([-vert_offset / 2, 0, vert_conn_altitude])
                rotate([0, 90, cap_type == "Atari XE Console Key" || cap_type == "Atari XE Console Set" || cap_type == "Atari XE F1-4 Set" ? -45 : 0])
                  cylinder(r = vert_conn_radius, h = vert_conn_length, center = true);
            }
          }
        }
      }
    }
  }
  if (support) {
    translate([-vert_offset / 2, -horiz_offset / 2, support_z_offset])
      #cube([support_plate_width, support_plate_length, support_plate_height]);
  }
}
